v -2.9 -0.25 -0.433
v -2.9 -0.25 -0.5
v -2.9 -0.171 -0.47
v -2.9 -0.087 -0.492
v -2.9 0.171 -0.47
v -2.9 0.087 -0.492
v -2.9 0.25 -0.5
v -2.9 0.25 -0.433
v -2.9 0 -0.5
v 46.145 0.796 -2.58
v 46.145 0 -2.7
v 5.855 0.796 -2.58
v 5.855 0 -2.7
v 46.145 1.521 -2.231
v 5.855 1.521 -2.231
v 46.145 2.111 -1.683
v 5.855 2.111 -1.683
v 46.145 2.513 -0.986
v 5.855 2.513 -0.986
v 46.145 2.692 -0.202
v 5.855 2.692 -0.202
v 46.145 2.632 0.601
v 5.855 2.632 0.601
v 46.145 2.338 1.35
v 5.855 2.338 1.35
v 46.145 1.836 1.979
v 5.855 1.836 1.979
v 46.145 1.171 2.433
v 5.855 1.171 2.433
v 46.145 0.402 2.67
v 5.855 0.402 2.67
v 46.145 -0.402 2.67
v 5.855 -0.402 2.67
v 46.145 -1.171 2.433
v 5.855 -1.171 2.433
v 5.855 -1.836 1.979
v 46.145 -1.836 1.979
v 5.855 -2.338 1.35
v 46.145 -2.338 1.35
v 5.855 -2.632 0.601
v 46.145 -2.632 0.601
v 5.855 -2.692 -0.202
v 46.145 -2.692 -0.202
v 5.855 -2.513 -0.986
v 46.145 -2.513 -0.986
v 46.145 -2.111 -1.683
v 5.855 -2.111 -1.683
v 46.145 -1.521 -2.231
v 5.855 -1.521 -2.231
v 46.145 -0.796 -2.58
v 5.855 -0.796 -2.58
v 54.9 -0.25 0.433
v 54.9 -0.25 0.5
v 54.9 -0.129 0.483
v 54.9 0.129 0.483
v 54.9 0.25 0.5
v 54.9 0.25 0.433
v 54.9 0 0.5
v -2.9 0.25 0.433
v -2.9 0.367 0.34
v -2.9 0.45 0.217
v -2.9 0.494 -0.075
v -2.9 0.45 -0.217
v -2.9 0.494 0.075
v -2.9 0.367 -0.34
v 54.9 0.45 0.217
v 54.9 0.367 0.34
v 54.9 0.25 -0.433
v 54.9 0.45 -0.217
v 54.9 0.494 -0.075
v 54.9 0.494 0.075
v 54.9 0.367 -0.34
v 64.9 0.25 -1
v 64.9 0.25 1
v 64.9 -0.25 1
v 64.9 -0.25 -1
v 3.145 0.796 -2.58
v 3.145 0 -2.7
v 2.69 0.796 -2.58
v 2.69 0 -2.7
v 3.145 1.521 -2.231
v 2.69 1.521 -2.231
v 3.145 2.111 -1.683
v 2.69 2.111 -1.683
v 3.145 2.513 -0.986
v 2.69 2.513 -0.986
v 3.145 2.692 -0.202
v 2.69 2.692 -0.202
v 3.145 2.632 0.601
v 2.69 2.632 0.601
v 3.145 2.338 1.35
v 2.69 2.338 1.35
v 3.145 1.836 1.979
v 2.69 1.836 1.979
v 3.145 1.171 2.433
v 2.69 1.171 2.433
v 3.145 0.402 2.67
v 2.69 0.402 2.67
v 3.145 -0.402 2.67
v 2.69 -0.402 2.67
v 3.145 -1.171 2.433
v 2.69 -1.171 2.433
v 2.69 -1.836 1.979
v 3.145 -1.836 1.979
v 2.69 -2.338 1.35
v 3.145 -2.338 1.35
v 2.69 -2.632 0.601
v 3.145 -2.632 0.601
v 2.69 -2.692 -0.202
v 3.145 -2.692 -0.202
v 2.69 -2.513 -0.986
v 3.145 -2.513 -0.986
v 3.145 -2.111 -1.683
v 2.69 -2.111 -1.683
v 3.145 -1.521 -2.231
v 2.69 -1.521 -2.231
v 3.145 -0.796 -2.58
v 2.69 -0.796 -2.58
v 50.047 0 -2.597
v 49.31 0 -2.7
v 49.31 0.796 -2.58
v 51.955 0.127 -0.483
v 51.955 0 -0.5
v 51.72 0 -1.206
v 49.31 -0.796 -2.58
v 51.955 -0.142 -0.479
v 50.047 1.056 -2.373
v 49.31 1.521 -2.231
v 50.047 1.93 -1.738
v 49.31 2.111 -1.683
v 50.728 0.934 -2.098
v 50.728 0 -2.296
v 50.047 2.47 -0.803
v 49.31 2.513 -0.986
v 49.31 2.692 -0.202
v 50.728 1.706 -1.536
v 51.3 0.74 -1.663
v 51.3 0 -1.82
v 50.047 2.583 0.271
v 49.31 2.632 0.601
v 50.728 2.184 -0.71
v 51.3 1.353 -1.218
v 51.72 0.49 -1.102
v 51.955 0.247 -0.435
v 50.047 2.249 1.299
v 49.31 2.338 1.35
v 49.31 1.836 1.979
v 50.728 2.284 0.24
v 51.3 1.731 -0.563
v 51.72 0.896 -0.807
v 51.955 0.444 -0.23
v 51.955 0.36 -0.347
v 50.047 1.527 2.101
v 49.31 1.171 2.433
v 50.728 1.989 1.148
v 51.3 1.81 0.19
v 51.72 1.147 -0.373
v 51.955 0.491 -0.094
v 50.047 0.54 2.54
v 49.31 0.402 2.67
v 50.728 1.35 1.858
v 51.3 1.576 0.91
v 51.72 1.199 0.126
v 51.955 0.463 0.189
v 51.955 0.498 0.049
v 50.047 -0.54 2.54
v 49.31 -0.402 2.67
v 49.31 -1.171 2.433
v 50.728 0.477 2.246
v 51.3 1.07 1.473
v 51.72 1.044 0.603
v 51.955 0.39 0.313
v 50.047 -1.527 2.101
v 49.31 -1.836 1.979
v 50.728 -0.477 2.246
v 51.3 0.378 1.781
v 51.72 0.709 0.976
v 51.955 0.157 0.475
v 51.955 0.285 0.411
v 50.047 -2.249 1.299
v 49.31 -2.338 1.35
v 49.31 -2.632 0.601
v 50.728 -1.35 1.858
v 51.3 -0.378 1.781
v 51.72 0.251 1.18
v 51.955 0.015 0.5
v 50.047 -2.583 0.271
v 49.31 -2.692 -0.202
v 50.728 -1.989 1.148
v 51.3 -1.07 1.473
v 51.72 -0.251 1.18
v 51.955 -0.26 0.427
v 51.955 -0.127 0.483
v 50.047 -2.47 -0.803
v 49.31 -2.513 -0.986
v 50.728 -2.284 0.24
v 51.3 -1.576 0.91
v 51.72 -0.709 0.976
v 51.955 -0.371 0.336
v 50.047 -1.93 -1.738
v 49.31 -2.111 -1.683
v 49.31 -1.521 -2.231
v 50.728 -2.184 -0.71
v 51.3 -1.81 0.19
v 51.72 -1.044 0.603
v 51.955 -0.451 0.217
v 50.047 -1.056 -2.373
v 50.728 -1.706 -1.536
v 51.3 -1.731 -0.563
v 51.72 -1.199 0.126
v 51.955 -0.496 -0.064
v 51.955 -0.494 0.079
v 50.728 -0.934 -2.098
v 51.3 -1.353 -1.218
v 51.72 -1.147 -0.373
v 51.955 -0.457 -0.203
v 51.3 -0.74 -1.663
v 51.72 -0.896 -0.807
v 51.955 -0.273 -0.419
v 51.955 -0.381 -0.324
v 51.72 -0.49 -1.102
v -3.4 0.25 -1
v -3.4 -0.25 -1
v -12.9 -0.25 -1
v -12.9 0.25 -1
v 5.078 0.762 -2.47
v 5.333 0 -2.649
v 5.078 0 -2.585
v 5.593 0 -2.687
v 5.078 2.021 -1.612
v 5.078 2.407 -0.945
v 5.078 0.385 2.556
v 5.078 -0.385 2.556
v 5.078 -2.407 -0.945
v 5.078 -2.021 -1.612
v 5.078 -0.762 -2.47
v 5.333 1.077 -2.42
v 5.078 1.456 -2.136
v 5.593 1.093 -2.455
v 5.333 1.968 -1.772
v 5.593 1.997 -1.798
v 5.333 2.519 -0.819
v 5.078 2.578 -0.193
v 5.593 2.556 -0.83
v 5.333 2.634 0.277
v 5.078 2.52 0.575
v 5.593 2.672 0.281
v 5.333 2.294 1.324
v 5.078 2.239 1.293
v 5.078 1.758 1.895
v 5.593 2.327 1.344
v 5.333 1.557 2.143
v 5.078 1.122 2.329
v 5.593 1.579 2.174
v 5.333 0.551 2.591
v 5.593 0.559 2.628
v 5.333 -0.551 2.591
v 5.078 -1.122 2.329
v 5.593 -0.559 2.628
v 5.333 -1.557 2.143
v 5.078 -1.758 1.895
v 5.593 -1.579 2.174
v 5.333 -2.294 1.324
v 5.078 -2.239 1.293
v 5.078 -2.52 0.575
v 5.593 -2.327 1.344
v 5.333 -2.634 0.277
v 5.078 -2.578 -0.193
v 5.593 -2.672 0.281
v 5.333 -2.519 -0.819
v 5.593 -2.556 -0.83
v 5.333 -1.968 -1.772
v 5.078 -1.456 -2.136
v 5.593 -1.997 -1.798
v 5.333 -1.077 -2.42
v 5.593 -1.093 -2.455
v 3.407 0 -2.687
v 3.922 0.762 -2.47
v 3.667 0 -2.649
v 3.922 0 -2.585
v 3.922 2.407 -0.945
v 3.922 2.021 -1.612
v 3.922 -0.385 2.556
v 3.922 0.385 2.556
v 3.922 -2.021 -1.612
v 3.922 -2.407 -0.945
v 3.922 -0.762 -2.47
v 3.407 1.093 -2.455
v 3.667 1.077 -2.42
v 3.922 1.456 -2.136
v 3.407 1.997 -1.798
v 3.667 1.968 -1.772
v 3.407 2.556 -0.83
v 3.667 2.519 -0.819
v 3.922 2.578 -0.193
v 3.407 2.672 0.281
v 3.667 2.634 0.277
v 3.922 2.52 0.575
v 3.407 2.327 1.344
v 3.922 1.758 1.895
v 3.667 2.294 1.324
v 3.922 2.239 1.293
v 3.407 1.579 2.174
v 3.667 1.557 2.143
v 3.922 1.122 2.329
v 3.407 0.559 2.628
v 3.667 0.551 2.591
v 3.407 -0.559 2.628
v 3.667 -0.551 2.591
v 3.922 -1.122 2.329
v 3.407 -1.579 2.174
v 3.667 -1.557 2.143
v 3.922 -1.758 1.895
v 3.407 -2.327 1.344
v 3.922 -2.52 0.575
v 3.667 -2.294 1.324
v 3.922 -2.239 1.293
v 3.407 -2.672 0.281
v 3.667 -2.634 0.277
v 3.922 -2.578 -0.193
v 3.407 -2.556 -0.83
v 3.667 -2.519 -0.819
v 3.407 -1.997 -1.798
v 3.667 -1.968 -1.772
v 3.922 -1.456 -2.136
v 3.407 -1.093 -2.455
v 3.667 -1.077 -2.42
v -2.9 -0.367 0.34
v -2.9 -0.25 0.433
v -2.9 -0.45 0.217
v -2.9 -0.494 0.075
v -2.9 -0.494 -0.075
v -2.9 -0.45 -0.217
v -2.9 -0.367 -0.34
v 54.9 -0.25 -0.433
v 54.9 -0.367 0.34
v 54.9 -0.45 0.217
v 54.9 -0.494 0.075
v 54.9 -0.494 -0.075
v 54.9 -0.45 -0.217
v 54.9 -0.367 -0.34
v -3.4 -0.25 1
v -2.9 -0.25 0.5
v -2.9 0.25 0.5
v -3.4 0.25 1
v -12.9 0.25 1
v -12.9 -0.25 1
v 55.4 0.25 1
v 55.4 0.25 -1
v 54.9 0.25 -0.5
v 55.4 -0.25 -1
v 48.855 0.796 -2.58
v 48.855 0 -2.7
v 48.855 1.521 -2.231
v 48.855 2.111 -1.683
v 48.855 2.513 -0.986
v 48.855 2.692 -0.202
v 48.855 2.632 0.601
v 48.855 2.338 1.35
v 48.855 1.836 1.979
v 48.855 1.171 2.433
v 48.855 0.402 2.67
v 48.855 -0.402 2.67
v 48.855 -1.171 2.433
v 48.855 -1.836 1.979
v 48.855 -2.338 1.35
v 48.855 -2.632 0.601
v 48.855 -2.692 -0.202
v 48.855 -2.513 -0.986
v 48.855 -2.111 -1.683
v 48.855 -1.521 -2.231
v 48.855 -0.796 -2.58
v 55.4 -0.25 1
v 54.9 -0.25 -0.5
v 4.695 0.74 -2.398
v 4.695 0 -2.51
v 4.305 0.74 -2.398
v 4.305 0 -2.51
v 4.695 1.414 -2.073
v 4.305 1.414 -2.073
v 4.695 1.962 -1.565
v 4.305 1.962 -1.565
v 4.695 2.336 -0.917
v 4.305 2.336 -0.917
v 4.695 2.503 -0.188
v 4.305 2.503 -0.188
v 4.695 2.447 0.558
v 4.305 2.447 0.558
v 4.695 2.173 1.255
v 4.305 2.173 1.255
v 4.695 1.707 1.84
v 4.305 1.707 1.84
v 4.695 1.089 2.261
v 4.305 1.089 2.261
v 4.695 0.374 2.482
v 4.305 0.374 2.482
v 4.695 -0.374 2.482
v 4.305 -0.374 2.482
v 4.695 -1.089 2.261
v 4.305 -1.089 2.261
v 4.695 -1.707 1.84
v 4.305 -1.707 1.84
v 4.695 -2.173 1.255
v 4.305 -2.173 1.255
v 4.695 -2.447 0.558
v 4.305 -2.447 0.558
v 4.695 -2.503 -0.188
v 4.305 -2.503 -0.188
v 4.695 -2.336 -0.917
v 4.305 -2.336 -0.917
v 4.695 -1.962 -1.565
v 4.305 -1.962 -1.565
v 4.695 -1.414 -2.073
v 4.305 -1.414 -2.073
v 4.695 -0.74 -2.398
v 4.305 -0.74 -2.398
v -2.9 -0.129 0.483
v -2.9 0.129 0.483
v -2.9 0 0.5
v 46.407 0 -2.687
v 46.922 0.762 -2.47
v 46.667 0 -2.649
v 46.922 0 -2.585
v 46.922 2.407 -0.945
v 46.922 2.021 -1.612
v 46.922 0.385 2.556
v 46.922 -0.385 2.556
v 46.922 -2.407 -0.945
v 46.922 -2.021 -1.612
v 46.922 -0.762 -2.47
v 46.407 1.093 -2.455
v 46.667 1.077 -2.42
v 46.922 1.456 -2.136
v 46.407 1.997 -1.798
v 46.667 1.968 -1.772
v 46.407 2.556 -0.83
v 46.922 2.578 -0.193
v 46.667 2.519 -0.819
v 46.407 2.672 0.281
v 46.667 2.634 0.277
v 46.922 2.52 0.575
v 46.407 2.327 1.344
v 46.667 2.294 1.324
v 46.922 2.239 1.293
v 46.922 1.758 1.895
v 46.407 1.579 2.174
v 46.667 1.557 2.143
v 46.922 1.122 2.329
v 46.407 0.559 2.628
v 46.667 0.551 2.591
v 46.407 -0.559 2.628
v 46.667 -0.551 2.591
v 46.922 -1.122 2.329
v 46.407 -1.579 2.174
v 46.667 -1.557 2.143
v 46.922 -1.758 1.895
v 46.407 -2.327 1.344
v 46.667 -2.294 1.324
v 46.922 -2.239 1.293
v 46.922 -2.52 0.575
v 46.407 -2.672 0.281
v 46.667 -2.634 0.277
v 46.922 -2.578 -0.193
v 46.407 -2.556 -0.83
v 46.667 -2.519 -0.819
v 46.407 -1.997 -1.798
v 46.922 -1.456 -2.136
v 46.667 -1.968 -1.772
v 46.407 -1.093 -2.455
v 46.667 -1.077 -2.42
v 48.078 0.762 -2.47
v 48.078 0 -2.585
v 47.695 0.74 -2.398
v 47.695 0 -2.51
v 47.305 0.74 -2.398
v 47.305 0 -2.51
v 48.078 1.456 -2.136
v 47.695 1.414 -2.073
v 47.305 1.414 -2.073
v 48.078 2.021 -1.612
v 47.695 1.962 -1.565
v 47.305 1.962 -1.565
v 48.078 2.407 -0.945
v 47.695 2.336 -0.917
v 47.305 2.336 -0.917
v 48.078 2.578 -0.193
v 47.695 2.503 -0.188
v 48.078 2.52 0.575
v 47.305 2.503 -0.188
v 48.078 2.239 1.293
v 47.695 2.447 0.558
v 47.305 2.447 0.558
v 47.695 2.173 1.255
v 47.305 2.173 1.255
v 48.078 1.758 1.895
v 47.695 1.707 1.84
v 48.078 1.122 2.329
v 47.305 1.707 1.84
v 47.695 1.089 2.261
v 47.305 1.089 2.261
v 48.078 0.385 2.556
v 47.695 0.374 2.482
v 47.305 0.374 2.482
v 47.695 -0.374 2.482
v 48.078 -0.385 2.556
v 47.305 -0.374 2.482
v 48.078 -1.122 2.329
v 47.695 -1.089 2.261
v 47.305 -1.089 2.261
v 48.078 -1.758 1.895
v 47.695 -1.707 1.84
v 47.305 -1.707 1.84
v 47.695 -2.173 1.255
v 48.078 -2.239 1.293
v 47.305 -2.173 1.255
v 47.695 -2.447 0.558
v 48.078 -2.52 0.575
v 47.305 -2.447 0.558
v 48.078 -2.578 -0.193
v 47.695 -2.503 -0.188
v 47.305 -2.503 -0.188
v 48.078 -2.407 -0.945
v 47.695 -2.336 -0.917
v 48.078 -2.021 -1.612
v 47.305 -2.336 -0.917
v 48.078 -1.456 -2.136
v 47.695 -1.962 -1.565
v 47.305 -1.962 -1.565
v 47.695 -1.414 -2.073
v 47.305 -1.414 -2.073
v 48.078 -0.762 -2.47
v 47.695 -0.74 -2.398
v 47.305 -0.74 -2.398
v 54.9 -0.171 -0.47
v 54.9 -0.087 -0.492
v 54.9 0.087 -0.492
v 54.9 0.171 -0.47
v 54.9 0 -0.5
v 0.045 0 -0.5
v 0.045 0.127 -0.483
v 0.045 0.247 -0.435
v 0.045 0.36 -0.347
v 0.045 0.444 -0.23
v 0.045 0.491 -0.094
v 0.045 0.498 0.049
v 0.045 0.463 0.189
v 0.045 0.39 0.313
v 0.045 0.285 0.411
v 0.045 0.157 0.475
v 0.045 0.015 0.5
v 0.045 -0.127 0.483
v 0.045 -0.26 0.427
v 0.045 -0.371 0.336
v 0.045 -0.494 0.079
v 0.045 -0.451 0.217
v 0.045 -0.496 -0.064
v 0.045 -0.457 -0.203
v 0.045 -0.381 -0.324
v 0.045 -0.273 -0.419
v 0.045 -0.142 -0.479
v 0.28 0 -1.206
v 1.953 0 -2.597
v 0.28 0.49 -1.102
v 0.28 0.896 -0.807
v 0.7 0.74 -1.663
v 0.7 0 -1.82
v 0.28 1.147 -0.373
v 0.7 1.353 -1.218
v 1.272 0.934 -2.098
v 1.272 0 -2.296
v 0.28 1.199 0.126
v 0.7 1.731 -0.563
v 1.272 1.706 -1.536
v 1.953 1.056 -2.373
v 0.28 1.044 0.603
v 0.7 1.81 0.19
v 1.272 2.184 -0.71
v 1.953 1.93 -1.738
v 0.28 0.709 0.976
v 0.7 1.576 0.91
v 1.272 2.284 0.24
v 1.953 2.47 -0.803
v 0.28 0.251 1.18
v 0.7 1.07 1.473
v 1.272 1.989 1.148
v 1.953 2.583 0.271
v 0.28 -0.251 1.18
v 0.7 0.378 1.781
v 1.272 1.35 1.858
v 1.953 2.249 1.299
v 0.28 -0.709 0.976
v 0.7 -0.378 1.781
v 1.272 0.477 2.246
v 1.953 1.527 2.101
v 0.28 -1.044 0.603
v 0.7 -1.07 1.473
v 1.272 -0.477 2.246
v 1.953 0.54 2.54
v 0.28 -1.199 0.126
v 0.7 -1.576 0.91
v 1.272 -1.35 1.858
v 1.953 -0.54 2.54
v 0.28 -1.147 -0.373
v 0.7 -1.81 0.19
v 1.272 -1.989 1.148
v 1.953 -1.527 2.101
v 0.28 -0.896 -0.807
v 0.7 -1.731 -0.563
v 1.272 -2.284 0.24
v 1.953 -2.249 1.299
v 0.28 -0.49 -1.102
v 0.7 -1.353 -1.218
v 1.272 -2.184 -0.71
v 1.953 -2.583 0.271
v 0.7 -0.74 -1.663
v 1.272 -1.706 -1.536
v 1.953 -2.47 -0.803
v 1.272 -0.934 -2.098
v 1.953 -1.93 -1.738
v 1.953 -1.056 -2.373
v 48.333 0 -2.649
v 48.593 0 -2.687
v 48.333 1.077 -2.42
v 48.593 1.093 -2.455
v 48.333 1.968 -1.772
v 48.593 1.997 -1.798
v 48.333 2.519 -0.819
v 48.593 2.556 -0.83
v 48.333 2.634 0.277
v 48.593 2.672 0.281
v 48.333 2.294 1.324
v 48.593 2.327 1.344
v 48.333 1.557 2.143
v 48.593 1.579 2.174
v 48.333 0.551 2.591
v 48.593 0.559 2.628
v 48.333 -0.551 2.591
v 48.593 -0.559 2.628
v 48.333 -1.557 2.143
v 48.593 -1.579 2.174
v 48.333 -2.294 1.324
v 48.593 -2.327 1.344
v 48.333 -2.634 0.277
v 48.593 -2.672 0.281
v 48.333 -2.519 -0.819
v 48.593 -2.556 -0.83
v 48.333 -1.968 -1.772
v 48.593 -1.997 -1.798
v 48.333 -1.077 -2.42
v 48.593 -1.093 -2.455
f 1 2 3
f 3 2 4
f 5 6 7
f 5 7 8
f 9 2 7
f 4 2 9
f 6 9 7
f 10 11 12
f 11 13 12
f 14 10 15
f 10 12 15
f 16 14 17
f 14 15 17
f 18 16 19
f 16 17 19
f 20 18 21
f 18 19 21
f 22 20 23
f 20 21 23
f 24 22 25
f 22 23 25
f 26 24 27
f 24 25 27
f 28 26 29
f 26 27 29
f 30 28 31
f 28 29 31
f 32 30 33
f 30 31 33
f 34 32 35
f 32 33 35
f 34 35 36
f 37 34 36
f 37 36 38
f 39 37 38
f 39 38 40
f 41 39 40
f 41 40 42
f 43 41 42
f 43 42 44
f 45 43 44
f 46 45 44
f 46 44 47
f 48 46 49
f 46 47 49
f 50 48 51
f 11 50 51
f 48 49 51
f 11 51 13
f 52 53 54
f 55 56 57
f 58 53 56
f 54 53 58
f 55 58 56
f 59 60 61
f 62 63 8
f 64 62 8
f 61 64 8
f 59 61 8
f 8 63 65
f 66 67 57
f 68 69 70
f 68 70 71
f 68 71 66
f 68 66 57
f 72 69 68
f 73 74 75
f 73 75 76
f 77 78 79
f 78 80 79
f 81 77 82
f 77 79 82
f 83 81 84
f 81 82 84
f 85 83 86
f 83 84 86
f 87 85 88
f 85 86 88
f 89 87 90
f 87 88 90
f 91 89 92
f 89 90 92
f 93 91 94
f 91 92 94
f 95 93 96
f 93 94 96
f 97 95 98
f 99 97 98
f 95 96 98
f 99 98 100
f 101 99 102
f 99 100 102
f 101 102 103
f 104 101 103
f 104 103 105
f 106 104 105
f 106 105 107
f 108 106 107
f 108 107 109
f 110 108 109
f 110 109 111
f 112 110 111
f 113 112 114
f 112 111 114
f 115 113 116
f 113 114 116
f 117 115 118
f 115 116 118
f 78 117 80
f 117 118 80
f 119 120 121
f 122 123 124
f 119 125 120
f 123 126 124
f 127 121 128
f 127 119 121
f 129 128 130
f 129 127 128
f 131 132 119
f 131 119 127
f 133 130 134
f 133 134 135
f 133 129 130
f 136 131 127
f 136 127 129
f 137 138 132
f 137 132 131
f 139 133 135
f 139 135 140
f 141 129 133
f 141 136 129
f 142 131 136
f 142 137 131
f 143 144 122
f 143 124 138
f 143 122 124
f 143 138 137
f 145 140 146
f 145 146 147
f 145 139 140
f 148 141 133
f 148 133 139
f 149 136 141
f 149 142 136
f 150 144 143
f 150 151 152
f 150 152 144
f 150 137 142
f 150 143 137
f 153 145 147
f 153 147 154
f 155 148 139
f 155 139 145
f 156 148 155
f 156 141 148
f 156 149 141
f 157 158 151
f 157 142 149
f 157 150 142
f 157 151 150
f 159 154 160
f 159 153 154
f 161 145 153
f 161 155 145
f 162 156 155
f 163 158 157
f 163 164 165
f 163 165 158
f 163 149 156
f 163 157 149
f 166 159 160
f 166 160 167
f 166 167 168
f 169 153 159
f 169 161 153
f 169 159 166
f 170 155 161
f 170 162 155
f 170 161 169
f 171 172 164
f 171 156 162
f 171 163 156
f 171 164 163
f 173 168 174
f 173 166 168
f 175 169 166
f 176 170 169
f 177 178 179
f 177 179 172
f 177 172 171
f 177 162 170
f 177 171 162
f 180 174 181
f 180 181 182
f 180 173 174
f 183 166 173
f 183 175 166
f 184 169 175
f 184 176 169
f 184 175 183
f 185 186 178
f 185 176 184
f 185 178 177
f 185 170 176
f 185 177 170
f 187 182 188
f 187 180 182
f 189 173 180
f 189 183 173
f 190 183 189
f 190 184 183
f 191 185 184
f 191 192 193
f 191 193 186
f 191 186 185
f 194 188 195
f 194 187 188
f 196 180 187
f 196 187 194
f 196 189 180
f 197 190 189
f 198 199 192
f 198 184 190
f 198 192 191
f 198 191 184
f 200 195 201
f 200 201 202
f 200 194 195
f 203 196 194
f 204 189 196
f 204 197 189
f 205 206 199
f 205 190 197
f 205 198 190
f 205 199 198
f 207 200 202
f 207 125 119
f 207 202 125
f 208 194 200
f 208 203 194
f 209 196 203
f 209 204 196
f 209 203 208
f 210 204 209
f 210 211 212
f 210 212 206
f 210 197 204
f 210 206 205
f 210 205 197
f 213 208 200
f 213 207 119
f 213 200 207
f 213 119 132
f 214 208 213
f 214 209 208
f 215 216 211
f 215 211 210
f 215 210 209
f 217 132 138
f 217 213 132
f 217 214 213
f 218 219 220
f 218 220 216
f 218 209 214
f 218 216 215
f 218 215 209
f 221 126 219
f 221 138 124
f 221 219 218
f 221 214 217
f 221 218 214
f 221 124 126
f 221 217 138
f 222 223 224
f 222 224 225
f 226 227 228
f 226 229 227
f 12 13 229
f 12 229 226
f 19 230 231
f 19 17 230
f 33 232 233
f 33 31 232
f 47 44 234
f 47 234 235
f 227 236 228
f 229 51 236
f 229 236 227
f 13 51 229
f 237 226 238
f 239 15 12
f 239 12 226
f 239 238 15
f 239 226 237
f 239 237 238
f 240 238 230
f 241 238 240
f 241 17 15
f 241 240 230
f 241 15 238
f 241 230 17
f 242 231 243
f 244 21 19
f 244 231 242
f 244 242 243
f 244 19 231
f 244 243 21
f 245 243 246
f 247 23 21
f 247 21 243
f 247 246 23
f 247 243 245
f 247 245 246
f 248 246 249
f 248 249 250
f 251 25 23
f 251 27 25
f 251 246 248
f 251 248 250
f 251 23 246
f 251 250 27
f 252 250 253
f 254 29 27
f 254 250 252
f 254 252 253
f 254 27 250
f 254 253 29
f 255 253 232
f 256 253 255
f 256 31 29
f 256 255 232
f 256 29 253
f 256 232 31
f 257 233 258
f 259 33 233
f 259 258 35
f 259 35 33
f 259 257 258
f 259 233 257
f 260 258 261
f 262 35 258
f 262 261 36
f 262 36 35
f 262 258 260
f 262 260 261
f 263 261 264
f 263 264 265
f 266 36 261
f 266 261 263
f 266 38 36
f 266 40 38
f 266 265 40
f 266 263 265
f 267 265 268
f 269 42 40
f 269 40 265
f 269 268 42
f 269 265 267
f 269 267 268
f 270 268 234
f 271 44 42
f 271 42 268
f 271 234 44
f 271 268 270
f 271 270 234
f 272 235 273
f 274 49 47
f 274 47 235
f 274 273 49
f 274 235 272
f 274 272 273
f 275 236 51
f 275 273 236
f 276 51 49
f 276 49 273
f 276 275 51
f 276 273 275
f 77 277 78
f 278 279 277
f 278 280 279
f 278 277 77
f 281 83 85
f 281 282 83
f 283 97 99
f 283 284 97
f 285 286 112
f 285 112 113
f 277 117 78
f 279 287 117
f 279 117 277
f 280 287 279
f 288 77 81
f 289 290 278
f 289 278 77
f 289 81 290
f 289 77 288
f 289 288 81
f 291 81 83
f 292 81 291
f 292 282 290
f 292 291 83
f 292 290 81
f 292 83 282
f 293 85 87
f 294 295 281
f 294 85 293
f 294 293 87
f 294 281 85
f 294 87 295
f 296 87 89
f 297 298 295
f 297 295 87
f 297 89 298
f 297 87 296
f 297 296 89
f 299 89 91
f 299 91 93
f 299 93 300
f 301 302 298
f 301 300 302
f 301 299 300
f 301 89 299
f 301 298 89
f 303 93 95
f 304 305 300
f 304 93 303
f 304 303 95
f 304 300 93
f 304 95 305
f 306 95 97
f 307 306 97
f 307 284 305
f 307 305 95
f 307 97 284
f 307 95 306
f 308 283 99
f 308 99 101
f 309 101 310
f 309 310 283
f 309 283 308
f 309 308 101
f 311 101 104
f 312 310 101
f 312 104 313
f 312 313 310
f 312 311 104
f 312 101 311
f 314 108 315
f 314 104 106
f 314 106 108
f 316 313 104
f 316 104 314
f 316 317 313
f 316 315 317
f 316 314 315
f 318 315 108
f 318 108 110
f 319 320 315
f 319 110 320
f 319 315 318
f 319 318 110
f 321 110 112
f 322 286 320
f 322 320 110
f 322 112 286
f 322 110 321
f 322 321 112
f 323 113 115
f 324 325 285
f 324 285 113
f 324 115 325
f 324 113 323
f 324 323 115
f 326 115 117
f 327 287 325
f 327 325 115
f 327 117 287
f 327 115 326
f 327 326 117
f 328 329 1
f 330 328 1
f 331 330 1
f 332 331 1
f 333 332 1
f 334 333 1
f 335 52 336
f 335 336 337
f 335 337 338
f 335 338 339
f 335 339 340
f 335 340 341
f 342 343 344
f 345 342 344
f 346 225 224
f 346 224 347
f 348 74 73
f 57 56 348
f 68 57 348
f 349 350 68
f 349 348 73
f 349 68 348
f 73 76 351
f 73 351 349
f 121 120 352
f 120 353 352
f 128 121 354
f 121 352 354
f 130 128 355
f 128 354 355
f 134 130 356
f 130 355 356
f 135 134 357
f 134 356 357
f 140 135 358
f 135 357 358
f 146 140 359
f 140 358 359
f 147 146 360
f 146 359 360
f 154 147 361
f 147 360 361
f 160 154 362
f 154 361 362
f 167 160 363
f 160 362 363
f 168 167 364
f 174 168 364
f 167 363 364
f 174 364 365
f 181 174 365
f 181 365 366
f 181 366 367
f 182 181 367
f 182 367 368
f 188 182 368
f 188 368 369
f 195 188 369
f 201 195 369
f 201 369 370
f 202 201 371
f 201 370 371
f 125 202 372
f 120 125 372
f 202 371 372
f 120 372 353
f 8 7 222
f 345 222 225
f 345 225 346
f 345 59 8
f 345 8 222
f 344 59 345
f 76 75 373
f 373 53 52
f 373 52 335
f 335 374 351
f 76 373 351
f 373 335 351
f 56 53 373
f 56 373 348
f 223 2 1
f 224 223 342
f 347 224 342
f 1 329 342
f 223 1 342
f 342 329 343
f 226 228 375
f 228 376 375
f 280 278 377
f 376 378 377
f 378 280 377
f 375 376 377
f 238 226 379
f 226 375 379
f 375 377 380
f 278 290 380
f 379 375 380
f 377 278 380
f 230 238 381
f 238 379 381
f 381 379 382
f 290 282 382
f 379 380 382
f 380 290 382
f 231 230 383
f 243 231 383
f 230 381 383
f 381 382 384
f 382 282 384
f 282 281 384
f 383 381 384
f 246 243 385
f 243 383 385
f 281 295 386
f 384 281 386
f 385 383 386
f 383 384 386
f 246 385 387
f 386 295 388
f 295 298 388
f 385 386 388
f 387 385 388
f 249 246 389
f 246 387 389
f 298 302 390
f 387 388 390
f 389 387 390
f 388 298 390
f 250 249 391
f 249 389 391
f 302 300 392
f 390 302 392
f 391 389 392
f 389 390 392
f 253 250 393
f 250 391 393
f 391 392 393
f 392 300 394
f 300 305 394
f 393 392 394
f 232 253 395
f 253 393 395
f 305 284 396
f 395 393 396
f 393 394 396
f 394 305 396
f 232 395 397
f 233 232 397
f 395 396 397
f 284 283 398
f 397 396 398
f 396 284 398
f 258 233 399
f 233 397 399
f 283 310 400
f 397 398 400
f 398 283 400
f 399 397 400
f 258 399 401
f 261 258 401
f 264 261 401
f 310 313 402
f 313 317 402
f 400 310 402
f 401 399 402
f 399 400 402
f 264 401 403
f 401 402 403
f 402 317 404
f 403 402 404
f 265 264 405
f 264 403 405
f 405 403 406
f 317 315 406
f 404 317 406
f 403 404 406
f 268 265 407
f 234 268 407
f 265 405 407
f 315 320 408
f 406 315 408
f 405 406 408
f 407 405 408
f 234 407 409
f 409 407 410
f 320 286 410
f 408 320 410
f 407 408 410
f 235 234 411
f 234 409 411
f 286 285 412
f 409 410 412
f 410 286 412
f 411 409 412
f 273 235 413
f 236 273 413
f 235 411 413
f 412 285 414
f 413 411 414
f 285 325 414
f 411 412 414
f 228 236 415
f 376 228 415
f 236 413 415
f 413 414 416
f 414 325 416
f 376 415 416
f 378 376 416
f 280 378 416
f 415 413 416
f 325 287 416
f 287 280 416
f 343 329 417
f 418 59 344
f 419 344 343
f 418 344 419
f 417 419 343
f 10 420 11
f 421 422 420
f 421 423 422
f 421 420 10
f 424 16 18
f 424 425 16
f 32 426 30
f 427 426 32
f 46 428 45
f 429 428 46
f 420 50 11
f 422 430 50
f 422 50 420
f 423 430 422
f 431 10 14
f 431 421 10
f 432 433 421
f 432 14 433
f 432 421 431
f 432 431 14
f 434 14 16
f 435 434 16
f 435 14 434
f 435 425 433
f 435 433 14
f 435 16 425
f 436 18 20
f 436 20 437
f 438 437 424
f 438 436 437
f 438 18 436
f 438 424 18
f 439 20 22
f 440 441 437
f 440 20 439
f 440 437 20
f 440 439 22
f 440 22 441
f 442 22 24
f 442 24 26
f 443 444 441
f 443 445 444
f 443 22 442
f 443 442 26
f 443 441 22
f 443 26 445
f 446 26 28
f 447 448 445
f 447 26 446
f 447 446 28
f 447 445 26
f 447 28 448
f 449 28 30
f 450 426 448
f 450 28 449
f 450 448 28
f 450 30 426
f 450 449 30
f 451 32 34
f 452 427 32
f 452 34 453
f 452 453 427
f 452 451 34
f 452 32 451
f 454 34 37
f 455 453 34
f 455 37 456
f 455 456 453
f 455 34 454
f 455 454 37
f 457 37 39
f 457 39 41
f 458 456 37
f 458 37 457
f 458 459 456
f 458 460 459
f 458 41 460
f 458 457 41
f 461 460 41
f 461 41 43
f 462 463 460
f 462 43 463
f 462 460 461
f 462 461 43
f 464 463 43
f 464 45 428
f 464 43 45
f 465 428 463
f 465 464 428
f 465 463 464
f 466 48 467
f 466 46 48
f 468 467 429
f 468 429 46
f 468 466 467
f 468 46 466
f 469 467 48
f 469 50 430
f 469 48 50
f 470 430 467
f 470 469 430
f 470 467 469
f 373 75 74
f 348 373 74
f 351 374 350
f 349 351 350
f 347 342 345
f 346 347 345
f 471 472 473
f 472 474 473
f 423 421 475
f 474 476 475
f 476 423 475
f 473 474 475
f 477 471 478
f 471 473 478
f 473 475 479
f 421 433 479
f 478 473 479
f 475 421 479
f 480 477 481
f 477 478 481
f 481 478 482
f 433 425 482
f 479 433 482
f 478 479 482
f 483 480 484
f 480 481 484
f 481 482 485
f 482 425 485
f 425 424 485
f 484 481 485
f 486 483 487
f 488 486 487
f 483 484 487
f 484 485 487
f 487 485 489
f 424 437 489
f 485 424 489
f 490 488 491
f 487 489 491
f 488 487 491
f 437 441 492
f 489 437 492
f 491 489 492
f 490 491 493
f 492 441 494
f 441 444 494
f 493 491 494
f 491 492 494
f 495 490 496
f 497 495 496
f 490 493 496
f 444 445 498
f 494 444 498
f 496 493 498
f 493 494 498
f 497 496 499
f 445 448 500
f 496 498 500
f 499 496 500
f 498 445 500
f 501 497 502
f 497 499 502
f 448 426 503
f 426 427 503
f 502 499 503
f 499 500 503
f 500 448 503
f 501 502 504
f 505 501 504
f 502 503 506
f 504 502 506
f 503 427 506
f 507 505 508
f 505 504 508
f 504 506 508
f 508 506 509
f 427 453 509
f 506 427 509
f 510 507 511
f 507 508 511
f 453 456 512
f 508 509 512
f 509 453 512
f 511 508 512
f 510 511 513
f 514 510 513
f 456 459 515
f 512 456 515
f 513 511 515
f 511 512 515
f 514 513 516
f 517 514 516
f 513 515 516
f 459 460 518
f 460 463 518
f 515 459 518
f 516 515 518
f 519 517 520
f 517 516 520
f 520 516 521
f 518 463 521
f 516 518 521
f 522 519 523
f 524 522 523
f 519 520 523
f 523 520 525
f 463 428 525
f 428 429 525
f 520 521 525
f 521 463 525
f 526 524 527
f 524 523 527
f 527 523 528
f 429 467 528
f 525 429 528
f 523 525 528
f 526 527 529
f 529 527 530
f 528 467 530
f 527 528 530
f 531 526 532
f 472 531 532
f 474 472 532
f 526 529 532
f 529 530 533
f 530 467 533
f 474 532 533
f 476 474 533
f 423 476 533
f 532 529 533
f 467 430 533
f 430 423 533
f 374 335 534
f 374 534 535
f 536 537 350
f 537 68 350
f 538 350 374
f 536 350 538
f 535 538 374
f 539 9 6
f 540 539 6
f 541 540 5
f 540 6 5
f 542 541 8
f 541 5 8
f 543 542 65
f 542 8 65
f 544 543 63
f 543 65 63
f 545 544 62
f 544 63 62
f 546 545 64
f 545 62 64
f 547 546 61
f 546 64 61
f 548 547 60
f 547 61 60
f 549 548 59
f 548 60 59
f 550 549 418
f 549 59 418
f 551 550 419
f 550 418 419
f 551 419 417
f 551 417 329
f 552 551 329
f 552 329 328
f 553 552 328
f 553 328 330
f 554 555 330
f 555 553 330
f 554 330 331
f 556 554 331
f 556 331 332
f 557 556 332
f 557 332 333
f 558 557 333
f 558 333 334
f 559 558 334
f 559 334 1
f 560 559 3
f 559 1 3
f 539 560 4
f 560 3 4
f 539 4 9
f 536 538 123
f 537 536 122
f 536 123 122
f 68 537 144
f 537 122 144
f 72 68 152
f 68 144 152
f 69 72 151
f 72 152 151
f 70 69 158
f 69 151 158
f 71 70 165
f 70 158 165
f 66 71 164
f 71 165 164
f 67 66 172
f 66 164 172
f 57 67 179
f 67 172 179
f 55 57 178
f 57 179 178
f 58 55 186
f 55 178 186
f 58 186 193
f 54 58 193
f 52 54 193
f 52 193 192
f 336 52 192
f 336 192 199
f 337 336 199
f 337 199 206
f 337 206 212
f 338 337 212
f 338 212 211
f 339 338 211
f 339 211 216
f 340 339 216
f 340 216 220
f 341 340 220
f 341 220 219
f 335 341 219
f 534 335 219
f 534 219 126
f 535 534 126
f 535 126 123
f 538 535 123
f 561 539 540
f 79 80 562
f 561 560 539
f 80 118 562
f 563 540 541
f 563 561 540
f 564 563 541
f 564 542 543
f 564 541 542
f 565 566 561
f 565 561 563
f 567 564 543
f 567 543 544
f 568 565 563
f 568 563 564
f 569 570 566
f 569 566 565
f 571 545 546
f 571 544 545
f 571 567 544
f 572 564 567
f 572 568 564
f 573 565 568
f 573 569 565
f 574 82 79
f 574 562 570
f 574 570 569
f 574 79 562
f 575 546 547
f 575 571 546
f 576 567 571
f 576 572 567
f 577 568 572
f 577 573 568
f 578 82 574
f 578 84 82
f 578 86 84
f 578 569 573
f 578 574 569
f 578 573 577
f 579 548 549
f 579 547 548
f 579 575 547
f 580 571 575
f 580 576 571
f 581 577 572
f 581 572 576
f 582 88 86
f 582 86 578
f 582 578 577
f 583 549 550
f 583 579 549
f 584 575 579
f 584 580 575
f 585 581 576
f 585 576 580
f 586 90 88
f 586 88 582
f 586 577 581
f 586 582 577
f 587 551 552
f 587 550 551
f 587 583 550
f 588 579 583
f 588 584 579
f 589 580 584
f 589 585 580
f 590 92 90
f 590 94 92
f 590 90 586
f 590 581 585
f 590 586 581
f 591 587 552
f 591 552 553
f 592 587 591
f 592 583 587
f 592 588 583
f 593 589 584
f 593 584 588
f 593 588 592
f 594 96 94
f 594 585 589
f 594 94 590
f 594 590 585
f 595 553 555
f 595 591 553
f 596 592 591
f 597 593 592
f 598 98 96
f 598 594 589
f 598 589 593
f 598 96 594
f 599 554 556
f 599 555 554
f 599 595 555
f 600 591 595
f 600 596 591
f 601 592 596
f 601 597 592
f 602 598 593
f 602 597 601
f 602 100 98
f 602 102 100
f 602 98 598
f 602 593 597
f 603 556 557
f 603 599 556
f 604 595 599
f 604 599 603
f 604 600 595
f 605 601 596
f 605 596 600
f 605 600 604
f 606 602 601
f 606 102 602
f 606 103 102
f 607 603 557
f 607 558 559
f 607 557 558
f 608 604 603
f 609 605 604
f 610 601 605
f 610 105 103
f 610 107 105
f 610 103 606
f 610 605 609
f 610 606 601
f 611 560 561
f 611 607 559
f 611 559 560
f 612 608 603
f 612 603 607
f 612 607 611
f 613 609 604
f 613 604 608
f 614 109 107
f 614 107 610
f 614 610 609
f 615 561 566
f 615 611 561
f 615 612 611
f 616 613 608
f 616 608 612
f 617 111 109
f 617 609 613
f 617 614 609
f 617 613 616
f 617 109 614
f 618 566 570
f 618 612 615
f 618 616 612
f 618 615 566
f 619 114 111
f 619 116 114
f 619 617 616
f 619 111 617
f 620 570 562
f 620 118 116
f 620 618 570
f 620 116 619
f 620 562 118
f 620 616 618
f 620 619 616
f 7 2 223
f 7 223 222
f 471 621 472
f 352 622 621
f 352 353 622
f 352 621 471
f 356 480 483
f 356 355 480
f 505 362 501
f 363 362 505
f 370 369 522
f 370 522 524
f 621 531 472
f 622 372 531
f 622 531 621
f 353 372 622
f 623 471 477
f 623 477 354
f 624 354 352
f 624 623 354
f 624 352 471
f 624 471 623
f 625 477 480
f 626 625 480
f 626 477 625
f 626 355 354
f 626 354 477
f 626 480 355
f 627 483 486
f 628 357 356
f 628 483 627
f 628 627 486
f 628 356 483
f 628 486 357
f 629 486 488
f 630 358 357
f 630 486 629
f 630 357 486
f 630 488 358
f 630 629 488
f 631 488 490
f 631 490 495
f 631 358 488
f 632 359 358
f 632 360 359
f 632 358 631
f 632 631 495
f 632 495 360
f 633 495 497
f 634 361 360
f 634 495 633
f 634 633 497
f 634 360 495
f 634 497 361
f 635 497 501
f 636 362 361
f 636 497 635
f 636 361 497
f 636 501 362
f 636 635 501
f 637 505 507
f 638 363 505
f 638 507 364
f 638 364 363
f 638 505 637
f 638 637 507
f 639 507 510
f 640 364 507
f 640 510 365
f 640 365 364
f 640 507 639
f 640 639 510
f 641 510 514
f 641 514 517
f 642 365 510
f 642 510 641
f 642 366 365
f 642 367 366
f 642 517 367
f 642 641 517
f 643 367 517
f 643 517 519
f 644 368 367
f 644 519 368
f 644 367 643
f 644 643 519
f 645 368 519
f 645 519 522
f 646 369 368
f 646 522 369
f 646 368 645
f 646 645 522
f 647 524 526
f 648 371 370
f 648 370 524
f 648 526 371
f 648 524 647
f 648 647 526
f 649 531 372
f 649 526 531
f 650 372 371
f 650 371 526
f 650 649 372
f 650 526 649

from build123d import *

# Parameters (mm, degrees)
SKETCH_7_R      = 0.5
EXTRUDE_1_DEPTH = 57.8
SKETCH_8_W      = 2
SKETCH_8_H      = 0.5
EXTRUDE_2_DEPTH = 10
CHAMFER_1_SIZE  = 0.5
SKETCH_9_W      = 2
SKETCH_9_H      = 0.5
EXTRUDE_3_DEPTH = 10
CHAMFER_2_SIZE  = 0.5


with BuildPart() as part:
    # По траектории1: sweep along a path in Эскиз4
    with BuildLine(Plane(origin=(0, 0, 0), x_dir=(0, 0, -1), z_dir=(1, 0, 0))) as sweep_1_path:
        CenterArc((0, 0), 2.7, 0, 360)
    # Эскиз3 → По траектории1 (sweep)
    with BuildSketch(Plane(origin=(0, 0, 0), x_dir=(1, 0, 0), z_dir=(0, 1, 0))):
        with BuildLine():
            Line((48.854990775, 2.7), (49.31, 2.7))
            ThreePointArc((49.31, 2.7), (51.212117241, 1.912117241), (52, 0.01))
            Line((52, 0.01), (52, 0))
            Line((52, 0), (0, 0))
            Line((0, 0), (0, 0.01))
            ThreePointArc((0, 0.01), (0.787882759, 1.912117241), (2.69, 2.7))
            Line((2.69, 2.7), (3.145009225, 2.7))
            ThreePointArc((3.145009225, 2.7), (3.537804142, 2.671167442), (3.922178774, 2.585287846))
            ThreePointArc((3.922178774, 2.585287846), (4.5, 2.5), (5.077821226, 2.585287846))
            ThreePointArc((5.077821226, 2.585287846), (5.462195858, 2.671167442), (5.854990775, 2.7))
            Line((5.854990775, 2.7), (46.145009225, 2.7))
            ThreePointArc((46.145009225, 2.7), (46.537804142, 2.671167442), (46.922178774, 2.585287846))
            ThreePointArc((46.922178774, 2.585287846), (47.5, 2.5), (48.077821226, 2.585287846))
            ThreePointArc((48.077821226, 2.585287846), (48.462195858, 2.671167442), (48.854990775, 2.7))
        make_face()
    sweep(path=sweep_1_path.line)

    # Эскиз7 → Бобышка-Вытянуть1 (add)
    with BuildSketch(Plane(origin=(-2.9, 0, 0), x_dir=(0, 0, -1), z_dir=(1, 0, 0))):
        Circle(SKETCH_7_R)
    extrude(amount=EXTRUDE_1_DEPTH)

    # Эскиз8 → Бобышка-Вытянуть2 (add)
    with BuildSketch(Plane.ZY.offset(2.9)):
        Rectangle(SKETCH_8_W, SKETCH_8_H)
    extrude(amount=EXTRUDE_2_DEPTH)

    # Фаска1
    chamfer_1_edges = [part.edges().sort_by_distance(p)[0] for p in [
        (-2.9, 0, -1),
        (-2.9, 0, 1),
    ]]
    chamfer(chamfer_1_edges, length=CHAMFER_1_SIZE - 0.0001)  # a hair under: the kernel refuses the full size

    # Эскиз9 → Бобышка-Вытянуть3 (add)
    with BuildSketch(Plane(origin=(54.9, 0, 0), x_dir=(0, 0, -1), z_dir=(1, 0, 0))):
        Rectangle(SKETCH_9_W, SKETCH_9_H)
    extrude(amount=EXTRUDE_3_DEPTH)

    # Фаска2
    chamfer_2_edges = [part.edges().sort_by_distance(p)[0] for p in [
        (54.9, 0, -1),
        (54.9, 0, 1),
    ]]
    chamfer(chamfer_2_edges, length=CHAMFER_2_SIZE - 0.0001)  # a hair under: the kernel refuses the full size


solid = part.part
